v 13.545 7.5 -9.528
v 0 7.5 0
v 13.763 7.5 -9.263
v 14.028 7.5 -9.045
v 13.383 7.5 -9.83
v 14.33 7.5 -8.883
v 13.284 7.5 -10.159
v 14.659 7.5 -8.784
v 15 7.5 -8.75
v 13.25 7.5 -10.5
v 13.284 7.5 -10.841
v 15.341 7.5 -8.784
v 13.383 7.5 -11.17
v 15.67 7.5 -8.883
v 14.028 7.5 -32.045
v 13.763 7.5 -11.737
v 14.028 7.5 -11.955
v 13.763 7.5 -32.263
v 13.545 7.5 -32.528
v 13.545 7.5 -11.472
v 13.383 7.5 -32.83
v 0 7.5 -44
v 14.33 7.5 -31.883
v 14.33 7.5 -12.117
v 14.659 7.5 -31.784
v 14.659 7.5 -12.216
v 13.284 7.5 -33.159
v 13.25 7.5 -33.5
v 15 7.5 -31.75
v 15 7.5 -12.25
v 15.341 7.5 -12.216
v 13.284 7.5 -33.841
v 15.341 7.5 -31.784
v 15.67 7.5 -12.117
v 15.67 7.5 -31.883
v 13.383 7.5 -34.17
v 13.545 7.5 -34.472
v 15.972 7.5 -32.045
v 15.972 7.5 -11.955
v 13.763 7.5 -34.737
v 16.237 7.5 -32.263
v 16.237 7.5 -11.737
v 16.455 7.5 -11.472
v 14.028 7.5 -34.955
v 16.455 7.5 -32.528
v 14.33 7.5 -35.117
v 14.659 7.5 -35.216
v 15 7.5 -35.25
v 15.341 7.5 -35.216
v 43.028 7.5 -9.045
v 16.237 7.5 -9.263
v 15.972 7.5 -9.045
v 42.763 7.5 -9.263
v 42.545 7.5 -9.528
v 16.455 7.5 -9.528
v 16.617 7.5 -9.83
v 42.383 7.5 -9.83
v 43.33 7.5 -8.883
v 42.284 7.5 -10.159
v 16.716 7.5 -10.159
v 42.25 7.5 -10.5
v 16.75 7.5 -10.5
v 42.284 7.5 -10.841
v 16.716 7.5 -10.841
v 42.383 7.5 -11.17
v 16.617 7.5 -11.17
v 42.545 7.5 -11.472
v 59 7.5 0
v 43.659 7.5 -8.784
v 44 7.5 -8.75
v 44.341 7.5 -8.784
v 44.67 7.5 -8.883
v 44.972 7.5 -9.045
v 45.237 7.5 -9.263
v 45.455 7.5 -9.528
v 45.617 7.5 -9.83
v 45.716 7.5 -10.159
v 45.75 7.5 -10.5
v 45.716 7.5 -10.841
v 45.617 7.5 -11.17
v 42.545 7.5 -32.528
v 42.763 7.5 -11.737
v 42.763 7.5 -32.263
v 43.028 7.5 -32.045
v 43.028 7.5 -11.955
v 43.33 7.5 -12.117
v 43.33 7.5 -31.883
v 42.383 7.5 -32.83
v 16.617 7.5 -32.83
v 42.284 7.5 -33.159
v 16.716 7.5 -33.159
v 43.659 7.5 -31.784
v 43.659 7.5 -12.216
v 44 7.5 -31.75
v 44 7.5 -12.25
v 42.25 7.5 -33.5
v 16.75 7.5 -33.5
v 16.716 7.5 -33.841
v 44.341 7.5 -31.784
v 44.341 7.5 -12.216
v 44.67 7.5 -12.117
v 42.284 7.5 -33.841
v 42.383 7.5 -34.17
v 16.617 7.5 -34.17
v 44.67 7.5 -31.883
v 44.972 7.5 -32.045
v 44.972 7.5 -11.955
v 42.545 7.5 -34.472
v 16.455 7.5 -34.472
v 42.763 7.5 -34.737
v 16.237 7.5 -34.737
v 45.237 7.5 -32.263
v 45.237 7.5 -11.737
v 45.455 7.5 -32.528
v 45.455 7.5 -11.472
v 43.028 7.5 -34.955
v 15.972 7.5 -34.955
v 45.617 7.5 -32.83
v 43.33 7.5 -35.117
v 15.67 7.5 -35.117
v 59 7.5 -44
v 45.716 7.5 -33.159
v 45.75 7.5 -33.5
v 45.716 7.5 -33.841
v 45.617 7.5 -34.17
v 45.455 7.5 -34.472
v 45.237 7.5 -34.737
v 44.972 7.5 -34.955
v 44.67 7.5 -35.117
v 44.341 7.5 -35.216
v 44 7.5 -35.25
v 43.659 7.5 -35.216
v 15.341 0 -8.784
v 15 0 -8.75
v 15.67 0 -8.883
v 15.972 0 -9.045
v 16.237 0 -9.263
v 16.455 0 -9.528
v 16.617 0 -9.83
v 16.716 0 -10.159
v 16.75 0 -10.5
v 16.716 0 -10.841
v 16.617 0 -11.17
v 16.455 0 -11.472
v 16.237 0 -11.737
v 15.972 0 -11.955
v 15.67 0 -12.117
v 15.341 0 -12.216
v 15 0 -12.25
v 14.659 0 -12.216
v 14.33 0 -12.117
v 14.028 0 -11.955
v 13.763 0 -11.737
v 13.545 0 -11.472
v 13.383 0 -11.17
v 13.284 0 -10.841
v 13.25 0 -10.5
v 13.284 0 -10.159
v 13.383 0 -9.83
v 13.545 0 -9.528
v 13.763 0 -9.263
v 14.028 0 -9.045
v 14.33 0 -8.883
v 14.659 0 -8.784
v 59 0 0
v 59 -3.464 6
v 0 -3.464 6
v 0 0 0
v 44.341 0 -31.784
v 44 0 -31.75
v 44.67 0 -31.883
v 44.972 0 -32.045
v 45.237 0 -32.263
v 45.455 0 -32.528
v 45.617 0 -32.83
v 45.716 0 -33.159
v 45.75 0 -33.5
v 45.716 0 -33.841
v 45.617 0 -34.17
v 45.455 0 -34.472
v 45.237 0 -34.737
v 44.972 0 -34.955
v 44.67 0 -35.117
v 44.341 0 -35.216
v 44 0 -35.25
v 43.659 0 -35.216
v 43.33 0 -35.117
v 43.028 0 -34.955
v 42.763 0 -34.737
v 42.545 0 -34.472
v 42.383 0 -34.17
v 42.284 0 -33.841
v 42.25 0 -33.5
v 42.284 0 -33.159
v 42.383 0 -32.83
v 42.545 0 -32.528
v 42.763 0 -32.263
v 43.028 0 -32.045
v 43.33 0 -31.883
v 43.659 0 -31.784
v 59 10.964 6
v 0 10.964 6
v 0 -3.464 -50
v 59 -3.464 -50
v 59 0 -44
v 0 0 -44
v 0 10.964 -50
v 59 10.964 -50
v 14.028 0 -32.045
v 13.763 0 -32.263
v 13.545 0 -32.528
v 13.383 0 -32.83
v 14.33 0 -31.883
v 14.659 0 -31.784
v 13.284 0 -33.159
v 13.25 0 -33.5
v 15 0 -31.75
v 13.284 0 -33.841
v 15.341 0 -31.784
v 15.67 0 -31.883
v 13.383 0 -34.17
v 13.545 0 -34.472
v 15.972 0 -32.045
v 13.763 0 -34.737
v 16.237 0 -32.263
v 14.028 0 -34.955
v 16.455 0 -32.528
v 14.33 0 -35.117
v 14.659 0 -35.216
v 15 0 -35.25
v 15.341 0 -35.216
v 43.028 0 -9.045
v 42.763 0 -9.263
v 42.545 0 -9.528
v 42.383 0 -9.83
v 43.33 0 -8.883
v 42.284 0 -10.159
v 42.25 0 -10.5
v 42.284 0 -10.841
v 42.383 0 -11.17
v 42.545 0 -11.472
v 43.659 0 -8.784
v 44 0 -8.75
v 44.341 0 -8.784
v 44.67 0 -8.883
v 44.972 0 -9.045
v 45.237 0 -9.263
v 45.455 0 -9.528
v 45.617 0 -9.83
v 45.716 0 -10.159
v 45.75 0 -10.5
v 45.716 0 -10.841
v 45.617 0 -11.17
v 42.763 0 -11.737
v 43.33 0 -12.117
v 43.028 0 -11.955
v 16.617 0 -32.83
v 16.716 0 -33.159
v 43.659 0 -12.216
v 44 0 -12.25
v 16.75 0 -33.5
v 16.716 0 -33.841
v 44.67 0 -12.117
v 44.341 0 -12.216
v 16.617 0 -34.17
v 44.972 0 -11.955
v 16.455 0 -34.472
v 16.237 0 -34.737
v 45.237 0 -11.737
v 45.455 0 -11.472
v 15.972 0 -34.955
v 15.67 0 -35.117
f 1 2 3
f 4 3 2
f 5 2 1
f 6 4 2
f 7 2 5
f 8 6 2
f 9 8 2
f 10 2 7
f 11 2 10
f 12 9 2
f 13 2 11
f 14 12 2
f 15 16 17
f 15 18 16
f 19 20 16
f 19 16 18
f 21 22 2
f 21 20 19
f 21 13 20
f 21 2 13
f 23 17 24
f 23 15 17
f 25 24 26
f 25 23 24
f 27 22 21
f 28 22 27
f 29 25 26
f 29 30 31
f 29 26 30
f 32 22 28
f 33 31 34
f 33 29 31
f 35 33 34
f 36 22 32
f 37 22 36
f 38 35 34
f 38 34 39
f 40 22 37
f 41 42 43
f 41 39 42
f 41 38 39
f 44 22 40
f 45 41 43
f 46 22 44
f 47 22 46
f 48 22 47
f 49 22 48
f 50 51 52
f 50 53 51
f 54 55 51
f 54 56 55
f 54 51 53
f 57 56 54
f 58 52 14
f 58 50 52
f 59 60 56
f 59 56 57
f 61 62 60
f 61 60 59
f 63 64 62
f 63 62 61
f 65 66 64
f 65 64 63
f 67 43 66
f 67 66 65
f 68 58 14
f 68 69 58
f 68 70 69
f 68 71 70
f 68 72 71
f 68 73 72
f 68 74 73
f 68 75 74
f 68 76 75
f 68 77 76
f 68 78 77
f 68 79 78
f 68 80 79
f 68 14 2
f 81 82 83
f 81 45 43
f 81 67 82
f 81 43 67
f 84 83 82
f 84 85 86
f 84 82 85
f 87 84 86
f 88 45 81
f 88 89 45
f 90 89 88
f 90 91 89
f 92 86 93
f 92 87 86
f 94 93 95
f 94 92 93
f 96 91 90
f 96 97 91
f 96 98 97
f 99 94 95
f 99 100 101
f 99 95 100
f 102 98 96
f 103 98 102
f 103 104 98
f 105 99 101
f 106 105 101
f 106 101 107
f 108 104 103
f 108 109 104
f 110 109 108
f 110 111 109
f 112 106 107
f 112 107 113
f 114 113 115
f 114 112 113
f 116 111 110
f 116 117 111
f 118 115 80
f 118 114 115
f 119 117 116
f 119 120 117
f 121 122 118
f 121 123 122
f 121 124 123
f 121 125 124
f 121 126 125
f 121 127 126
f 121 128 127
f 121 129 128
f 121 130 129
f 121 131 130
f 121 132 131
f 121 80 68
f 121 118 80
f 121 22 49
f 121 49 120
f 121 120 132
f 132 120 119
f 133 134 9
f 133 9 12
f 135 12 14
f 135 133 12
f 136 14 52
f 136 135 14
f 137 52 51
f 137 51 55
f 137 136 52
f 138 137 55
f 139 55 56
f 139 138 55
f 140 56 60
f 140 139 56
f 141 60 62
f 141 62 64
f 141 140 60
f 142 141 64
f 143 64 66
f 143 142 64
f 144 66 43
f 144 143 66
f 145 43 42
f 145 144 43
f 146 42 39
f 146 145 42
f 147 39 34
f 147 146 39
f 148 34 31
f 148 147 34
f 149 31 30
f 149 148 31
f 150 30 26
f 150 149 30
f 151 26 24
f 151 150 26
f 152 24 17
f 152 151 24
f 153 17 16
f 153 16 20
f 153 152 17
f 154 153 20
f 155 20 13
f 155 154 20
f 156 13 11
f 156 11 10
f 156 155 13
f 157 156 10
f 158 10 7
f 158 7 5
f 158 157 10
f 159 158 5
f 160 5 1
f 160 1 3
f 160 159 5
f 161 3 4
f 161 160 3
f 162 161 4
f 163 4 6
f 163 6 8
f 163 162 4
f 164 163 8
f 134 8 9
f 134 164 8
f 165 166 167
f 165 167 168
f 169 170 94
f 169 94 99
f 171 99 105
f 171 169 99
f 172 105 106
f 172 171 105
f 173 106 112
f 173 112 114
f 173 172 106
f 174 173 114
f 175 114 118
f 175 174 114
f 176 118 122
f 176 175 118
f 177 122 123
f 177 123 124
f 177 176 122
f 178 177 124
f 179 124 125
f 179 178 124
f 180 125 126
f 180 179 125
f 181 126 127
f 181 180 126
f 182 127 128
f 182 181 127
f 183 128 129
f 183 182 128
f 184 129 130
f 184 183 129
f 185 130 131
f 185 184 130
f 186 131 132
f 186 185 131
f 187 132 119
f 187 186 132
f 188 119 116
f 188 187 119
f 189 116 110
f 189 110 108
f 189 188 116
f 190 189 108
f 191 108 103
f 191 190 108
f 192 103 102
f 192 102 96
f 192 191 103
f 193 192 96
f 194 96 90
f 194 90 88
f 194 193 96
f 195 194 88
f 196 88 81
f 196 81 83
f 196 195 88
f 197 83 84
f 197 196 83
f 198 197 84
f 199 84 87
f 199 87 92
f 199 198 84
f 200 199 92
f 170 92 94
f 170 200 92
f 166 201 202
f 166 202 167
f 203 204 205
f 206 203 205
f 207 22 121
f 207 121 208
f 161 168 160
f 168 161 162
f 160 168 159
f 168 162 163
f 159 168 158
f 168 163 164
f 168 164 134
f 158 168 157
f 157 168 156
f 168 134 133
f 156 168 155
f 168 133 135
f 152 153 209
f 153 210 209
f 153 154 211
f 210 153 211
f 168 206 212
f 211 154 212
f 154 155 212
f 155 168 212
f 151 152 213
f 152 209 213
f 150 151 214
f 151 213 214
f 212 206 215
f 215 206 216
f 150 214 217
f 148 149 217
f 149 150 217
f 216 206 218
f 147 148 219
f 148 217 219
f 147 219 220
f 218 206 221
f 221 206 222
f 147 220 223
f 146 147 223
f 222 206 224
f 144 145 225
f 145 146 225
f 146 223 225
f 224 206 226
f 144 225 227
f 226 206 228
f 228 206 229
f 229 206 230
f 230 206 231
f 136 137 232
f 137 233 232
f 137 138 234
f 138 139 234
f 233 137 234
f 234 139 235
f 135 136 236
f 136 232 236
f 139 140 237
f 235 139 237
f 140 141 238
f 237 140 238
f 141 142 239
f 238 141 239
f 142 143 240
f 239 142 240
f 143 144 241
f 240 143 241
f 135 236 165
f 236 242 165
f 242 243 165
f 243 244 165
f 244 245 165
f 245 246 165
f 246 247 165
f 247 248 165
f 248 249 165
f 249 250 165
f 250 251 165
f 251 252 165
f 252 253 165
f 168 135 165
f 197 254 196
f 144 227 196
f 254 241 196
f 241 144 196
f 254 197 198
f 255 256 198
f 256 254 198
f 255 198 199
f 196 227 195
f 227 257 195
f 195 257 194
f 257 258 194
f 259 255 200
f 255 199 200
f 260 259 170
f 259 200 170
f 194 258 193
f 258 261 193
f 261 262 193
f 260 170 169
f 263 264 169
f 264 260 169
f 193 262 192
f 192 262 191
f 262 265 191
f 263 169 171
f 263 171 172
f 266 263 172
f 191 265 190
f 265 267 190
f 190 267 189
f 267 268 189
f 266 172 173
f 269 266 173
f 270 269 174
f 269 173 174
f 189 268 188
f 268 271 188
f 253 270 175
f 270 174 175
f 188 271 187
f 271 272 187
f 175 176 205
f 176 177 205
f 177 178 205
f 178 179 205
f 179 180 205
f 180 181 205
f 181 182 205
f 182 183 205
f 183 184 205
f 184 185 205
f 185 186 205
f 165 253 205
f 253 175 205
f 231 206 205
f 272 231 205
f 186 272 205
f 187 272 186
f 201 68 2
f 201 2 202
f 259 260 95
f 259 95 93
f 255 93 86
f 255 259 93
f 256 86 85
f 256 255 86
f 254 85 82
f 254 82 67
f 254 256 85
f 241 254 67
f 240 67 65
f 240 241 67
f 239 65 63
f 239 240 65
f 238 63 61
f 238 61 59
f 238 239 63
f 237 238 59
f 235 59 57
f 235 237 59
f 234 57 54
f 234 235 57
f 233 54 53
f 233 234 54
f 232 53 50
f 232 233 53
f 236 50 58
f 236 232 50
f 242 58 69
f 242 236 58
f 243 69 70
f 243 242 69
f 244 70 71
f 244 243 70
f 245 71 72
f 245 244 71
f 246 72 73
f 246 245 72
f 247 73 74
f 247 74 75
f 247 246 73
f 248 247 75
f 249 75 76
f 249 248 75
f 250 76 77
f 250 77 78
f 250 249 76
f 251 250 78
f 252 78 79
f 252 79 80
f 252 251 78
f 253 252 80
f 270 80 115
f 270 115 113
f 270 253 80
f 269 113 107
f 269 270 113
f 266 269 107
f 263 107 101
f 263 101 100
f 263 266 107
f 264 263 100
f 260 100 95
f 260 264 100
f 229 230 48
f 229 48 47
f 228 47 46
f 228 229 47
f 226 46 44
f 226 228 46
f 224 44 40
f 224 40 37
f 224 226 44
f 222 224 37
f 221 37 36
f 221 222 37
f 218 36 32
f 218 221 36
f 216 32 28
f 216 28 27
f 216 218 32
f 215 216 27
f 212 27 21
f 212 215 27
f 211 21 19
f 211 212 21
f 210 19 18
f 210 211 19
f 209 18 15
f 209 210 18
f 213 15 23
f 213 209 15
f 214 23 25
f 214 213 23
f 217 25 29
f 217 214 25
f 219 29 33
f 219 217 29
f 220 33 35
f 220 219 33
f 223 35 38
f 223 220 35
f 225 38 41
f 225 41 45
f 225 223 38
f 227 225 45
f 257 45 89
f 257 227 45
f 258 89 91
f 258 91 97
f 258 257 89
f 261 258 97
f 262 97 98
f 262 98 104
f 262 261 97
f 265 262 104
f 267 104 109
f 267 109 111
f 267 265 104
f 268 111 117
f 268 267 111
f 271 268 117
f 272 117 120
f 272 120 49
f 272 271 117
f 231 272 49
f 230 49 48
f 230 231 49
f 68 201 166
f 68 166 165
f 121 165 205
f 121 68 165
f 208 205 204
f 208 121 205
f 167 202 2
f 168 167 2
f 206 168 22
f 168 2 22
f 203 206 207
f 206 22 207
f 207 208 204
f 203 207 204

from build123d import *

# Parameters (mm, degrees)
SKETCH1_W           = 59
SKETCH1_H           = 44
SKETCH1_R           = 1.75
BOSS_EXTRUDE1_DEPTH = 7.5
BOSS_EXTRUDE2_DEPTH = 59


with BuildPart() as part:
    # Sketch1 → Boss-Extrude1 (new body)
    with BuildSketch(Plane(origin=(0, 0, 0), x_dir=(1, 0, 0), z_dir=(0, 1, 0))):
        with Locations((29.5, 22)):
            Rectangle(SKETCH1_W, SKETCH1_H)
        with Locations(Location((15, 10.5, 0), (0, 0, 270))):
            Circle(SKETCH1_R, mode=Mode.SUBTRACT)
        with Locations(Location((44, 10.5, 0), (0, 0, 90))):
            Circle(SKETCH1_R, mode=Mode.SUBTRACT)
        with Locations(Location((15, 33.5, 0), (0, 0, 90))):
            Circle(SKETCH1_R, mode=Mode.SUBTRACT)
        with Locations(Location((44, 33.5, 0), (0, 0, 270))):
            Circle(SKETCH1_R, mode=Mode.SUBTRACT)
    extrude(amount=BOSS_EXTRUDE1_DEPTH)

    # Sketch3 → Boss-Extrude2 (add)
    with BuildSketch(Plane(origin=(59, 0, 0), x_dir=(0, 0, -1), z_dir=(1, 0, 0))):
        Polygon((0, 7.5), (-6, 10.964101615), (-6, -3.464101615), (0, 0), align=None)
        Polygon((44, 7.5), (50, 10.964101615), (50, -3.464101615), (44, 0), align=None)
    extrude(amount=-BOSS_EXTRUDE2_DEPTH)


solid = part.part
